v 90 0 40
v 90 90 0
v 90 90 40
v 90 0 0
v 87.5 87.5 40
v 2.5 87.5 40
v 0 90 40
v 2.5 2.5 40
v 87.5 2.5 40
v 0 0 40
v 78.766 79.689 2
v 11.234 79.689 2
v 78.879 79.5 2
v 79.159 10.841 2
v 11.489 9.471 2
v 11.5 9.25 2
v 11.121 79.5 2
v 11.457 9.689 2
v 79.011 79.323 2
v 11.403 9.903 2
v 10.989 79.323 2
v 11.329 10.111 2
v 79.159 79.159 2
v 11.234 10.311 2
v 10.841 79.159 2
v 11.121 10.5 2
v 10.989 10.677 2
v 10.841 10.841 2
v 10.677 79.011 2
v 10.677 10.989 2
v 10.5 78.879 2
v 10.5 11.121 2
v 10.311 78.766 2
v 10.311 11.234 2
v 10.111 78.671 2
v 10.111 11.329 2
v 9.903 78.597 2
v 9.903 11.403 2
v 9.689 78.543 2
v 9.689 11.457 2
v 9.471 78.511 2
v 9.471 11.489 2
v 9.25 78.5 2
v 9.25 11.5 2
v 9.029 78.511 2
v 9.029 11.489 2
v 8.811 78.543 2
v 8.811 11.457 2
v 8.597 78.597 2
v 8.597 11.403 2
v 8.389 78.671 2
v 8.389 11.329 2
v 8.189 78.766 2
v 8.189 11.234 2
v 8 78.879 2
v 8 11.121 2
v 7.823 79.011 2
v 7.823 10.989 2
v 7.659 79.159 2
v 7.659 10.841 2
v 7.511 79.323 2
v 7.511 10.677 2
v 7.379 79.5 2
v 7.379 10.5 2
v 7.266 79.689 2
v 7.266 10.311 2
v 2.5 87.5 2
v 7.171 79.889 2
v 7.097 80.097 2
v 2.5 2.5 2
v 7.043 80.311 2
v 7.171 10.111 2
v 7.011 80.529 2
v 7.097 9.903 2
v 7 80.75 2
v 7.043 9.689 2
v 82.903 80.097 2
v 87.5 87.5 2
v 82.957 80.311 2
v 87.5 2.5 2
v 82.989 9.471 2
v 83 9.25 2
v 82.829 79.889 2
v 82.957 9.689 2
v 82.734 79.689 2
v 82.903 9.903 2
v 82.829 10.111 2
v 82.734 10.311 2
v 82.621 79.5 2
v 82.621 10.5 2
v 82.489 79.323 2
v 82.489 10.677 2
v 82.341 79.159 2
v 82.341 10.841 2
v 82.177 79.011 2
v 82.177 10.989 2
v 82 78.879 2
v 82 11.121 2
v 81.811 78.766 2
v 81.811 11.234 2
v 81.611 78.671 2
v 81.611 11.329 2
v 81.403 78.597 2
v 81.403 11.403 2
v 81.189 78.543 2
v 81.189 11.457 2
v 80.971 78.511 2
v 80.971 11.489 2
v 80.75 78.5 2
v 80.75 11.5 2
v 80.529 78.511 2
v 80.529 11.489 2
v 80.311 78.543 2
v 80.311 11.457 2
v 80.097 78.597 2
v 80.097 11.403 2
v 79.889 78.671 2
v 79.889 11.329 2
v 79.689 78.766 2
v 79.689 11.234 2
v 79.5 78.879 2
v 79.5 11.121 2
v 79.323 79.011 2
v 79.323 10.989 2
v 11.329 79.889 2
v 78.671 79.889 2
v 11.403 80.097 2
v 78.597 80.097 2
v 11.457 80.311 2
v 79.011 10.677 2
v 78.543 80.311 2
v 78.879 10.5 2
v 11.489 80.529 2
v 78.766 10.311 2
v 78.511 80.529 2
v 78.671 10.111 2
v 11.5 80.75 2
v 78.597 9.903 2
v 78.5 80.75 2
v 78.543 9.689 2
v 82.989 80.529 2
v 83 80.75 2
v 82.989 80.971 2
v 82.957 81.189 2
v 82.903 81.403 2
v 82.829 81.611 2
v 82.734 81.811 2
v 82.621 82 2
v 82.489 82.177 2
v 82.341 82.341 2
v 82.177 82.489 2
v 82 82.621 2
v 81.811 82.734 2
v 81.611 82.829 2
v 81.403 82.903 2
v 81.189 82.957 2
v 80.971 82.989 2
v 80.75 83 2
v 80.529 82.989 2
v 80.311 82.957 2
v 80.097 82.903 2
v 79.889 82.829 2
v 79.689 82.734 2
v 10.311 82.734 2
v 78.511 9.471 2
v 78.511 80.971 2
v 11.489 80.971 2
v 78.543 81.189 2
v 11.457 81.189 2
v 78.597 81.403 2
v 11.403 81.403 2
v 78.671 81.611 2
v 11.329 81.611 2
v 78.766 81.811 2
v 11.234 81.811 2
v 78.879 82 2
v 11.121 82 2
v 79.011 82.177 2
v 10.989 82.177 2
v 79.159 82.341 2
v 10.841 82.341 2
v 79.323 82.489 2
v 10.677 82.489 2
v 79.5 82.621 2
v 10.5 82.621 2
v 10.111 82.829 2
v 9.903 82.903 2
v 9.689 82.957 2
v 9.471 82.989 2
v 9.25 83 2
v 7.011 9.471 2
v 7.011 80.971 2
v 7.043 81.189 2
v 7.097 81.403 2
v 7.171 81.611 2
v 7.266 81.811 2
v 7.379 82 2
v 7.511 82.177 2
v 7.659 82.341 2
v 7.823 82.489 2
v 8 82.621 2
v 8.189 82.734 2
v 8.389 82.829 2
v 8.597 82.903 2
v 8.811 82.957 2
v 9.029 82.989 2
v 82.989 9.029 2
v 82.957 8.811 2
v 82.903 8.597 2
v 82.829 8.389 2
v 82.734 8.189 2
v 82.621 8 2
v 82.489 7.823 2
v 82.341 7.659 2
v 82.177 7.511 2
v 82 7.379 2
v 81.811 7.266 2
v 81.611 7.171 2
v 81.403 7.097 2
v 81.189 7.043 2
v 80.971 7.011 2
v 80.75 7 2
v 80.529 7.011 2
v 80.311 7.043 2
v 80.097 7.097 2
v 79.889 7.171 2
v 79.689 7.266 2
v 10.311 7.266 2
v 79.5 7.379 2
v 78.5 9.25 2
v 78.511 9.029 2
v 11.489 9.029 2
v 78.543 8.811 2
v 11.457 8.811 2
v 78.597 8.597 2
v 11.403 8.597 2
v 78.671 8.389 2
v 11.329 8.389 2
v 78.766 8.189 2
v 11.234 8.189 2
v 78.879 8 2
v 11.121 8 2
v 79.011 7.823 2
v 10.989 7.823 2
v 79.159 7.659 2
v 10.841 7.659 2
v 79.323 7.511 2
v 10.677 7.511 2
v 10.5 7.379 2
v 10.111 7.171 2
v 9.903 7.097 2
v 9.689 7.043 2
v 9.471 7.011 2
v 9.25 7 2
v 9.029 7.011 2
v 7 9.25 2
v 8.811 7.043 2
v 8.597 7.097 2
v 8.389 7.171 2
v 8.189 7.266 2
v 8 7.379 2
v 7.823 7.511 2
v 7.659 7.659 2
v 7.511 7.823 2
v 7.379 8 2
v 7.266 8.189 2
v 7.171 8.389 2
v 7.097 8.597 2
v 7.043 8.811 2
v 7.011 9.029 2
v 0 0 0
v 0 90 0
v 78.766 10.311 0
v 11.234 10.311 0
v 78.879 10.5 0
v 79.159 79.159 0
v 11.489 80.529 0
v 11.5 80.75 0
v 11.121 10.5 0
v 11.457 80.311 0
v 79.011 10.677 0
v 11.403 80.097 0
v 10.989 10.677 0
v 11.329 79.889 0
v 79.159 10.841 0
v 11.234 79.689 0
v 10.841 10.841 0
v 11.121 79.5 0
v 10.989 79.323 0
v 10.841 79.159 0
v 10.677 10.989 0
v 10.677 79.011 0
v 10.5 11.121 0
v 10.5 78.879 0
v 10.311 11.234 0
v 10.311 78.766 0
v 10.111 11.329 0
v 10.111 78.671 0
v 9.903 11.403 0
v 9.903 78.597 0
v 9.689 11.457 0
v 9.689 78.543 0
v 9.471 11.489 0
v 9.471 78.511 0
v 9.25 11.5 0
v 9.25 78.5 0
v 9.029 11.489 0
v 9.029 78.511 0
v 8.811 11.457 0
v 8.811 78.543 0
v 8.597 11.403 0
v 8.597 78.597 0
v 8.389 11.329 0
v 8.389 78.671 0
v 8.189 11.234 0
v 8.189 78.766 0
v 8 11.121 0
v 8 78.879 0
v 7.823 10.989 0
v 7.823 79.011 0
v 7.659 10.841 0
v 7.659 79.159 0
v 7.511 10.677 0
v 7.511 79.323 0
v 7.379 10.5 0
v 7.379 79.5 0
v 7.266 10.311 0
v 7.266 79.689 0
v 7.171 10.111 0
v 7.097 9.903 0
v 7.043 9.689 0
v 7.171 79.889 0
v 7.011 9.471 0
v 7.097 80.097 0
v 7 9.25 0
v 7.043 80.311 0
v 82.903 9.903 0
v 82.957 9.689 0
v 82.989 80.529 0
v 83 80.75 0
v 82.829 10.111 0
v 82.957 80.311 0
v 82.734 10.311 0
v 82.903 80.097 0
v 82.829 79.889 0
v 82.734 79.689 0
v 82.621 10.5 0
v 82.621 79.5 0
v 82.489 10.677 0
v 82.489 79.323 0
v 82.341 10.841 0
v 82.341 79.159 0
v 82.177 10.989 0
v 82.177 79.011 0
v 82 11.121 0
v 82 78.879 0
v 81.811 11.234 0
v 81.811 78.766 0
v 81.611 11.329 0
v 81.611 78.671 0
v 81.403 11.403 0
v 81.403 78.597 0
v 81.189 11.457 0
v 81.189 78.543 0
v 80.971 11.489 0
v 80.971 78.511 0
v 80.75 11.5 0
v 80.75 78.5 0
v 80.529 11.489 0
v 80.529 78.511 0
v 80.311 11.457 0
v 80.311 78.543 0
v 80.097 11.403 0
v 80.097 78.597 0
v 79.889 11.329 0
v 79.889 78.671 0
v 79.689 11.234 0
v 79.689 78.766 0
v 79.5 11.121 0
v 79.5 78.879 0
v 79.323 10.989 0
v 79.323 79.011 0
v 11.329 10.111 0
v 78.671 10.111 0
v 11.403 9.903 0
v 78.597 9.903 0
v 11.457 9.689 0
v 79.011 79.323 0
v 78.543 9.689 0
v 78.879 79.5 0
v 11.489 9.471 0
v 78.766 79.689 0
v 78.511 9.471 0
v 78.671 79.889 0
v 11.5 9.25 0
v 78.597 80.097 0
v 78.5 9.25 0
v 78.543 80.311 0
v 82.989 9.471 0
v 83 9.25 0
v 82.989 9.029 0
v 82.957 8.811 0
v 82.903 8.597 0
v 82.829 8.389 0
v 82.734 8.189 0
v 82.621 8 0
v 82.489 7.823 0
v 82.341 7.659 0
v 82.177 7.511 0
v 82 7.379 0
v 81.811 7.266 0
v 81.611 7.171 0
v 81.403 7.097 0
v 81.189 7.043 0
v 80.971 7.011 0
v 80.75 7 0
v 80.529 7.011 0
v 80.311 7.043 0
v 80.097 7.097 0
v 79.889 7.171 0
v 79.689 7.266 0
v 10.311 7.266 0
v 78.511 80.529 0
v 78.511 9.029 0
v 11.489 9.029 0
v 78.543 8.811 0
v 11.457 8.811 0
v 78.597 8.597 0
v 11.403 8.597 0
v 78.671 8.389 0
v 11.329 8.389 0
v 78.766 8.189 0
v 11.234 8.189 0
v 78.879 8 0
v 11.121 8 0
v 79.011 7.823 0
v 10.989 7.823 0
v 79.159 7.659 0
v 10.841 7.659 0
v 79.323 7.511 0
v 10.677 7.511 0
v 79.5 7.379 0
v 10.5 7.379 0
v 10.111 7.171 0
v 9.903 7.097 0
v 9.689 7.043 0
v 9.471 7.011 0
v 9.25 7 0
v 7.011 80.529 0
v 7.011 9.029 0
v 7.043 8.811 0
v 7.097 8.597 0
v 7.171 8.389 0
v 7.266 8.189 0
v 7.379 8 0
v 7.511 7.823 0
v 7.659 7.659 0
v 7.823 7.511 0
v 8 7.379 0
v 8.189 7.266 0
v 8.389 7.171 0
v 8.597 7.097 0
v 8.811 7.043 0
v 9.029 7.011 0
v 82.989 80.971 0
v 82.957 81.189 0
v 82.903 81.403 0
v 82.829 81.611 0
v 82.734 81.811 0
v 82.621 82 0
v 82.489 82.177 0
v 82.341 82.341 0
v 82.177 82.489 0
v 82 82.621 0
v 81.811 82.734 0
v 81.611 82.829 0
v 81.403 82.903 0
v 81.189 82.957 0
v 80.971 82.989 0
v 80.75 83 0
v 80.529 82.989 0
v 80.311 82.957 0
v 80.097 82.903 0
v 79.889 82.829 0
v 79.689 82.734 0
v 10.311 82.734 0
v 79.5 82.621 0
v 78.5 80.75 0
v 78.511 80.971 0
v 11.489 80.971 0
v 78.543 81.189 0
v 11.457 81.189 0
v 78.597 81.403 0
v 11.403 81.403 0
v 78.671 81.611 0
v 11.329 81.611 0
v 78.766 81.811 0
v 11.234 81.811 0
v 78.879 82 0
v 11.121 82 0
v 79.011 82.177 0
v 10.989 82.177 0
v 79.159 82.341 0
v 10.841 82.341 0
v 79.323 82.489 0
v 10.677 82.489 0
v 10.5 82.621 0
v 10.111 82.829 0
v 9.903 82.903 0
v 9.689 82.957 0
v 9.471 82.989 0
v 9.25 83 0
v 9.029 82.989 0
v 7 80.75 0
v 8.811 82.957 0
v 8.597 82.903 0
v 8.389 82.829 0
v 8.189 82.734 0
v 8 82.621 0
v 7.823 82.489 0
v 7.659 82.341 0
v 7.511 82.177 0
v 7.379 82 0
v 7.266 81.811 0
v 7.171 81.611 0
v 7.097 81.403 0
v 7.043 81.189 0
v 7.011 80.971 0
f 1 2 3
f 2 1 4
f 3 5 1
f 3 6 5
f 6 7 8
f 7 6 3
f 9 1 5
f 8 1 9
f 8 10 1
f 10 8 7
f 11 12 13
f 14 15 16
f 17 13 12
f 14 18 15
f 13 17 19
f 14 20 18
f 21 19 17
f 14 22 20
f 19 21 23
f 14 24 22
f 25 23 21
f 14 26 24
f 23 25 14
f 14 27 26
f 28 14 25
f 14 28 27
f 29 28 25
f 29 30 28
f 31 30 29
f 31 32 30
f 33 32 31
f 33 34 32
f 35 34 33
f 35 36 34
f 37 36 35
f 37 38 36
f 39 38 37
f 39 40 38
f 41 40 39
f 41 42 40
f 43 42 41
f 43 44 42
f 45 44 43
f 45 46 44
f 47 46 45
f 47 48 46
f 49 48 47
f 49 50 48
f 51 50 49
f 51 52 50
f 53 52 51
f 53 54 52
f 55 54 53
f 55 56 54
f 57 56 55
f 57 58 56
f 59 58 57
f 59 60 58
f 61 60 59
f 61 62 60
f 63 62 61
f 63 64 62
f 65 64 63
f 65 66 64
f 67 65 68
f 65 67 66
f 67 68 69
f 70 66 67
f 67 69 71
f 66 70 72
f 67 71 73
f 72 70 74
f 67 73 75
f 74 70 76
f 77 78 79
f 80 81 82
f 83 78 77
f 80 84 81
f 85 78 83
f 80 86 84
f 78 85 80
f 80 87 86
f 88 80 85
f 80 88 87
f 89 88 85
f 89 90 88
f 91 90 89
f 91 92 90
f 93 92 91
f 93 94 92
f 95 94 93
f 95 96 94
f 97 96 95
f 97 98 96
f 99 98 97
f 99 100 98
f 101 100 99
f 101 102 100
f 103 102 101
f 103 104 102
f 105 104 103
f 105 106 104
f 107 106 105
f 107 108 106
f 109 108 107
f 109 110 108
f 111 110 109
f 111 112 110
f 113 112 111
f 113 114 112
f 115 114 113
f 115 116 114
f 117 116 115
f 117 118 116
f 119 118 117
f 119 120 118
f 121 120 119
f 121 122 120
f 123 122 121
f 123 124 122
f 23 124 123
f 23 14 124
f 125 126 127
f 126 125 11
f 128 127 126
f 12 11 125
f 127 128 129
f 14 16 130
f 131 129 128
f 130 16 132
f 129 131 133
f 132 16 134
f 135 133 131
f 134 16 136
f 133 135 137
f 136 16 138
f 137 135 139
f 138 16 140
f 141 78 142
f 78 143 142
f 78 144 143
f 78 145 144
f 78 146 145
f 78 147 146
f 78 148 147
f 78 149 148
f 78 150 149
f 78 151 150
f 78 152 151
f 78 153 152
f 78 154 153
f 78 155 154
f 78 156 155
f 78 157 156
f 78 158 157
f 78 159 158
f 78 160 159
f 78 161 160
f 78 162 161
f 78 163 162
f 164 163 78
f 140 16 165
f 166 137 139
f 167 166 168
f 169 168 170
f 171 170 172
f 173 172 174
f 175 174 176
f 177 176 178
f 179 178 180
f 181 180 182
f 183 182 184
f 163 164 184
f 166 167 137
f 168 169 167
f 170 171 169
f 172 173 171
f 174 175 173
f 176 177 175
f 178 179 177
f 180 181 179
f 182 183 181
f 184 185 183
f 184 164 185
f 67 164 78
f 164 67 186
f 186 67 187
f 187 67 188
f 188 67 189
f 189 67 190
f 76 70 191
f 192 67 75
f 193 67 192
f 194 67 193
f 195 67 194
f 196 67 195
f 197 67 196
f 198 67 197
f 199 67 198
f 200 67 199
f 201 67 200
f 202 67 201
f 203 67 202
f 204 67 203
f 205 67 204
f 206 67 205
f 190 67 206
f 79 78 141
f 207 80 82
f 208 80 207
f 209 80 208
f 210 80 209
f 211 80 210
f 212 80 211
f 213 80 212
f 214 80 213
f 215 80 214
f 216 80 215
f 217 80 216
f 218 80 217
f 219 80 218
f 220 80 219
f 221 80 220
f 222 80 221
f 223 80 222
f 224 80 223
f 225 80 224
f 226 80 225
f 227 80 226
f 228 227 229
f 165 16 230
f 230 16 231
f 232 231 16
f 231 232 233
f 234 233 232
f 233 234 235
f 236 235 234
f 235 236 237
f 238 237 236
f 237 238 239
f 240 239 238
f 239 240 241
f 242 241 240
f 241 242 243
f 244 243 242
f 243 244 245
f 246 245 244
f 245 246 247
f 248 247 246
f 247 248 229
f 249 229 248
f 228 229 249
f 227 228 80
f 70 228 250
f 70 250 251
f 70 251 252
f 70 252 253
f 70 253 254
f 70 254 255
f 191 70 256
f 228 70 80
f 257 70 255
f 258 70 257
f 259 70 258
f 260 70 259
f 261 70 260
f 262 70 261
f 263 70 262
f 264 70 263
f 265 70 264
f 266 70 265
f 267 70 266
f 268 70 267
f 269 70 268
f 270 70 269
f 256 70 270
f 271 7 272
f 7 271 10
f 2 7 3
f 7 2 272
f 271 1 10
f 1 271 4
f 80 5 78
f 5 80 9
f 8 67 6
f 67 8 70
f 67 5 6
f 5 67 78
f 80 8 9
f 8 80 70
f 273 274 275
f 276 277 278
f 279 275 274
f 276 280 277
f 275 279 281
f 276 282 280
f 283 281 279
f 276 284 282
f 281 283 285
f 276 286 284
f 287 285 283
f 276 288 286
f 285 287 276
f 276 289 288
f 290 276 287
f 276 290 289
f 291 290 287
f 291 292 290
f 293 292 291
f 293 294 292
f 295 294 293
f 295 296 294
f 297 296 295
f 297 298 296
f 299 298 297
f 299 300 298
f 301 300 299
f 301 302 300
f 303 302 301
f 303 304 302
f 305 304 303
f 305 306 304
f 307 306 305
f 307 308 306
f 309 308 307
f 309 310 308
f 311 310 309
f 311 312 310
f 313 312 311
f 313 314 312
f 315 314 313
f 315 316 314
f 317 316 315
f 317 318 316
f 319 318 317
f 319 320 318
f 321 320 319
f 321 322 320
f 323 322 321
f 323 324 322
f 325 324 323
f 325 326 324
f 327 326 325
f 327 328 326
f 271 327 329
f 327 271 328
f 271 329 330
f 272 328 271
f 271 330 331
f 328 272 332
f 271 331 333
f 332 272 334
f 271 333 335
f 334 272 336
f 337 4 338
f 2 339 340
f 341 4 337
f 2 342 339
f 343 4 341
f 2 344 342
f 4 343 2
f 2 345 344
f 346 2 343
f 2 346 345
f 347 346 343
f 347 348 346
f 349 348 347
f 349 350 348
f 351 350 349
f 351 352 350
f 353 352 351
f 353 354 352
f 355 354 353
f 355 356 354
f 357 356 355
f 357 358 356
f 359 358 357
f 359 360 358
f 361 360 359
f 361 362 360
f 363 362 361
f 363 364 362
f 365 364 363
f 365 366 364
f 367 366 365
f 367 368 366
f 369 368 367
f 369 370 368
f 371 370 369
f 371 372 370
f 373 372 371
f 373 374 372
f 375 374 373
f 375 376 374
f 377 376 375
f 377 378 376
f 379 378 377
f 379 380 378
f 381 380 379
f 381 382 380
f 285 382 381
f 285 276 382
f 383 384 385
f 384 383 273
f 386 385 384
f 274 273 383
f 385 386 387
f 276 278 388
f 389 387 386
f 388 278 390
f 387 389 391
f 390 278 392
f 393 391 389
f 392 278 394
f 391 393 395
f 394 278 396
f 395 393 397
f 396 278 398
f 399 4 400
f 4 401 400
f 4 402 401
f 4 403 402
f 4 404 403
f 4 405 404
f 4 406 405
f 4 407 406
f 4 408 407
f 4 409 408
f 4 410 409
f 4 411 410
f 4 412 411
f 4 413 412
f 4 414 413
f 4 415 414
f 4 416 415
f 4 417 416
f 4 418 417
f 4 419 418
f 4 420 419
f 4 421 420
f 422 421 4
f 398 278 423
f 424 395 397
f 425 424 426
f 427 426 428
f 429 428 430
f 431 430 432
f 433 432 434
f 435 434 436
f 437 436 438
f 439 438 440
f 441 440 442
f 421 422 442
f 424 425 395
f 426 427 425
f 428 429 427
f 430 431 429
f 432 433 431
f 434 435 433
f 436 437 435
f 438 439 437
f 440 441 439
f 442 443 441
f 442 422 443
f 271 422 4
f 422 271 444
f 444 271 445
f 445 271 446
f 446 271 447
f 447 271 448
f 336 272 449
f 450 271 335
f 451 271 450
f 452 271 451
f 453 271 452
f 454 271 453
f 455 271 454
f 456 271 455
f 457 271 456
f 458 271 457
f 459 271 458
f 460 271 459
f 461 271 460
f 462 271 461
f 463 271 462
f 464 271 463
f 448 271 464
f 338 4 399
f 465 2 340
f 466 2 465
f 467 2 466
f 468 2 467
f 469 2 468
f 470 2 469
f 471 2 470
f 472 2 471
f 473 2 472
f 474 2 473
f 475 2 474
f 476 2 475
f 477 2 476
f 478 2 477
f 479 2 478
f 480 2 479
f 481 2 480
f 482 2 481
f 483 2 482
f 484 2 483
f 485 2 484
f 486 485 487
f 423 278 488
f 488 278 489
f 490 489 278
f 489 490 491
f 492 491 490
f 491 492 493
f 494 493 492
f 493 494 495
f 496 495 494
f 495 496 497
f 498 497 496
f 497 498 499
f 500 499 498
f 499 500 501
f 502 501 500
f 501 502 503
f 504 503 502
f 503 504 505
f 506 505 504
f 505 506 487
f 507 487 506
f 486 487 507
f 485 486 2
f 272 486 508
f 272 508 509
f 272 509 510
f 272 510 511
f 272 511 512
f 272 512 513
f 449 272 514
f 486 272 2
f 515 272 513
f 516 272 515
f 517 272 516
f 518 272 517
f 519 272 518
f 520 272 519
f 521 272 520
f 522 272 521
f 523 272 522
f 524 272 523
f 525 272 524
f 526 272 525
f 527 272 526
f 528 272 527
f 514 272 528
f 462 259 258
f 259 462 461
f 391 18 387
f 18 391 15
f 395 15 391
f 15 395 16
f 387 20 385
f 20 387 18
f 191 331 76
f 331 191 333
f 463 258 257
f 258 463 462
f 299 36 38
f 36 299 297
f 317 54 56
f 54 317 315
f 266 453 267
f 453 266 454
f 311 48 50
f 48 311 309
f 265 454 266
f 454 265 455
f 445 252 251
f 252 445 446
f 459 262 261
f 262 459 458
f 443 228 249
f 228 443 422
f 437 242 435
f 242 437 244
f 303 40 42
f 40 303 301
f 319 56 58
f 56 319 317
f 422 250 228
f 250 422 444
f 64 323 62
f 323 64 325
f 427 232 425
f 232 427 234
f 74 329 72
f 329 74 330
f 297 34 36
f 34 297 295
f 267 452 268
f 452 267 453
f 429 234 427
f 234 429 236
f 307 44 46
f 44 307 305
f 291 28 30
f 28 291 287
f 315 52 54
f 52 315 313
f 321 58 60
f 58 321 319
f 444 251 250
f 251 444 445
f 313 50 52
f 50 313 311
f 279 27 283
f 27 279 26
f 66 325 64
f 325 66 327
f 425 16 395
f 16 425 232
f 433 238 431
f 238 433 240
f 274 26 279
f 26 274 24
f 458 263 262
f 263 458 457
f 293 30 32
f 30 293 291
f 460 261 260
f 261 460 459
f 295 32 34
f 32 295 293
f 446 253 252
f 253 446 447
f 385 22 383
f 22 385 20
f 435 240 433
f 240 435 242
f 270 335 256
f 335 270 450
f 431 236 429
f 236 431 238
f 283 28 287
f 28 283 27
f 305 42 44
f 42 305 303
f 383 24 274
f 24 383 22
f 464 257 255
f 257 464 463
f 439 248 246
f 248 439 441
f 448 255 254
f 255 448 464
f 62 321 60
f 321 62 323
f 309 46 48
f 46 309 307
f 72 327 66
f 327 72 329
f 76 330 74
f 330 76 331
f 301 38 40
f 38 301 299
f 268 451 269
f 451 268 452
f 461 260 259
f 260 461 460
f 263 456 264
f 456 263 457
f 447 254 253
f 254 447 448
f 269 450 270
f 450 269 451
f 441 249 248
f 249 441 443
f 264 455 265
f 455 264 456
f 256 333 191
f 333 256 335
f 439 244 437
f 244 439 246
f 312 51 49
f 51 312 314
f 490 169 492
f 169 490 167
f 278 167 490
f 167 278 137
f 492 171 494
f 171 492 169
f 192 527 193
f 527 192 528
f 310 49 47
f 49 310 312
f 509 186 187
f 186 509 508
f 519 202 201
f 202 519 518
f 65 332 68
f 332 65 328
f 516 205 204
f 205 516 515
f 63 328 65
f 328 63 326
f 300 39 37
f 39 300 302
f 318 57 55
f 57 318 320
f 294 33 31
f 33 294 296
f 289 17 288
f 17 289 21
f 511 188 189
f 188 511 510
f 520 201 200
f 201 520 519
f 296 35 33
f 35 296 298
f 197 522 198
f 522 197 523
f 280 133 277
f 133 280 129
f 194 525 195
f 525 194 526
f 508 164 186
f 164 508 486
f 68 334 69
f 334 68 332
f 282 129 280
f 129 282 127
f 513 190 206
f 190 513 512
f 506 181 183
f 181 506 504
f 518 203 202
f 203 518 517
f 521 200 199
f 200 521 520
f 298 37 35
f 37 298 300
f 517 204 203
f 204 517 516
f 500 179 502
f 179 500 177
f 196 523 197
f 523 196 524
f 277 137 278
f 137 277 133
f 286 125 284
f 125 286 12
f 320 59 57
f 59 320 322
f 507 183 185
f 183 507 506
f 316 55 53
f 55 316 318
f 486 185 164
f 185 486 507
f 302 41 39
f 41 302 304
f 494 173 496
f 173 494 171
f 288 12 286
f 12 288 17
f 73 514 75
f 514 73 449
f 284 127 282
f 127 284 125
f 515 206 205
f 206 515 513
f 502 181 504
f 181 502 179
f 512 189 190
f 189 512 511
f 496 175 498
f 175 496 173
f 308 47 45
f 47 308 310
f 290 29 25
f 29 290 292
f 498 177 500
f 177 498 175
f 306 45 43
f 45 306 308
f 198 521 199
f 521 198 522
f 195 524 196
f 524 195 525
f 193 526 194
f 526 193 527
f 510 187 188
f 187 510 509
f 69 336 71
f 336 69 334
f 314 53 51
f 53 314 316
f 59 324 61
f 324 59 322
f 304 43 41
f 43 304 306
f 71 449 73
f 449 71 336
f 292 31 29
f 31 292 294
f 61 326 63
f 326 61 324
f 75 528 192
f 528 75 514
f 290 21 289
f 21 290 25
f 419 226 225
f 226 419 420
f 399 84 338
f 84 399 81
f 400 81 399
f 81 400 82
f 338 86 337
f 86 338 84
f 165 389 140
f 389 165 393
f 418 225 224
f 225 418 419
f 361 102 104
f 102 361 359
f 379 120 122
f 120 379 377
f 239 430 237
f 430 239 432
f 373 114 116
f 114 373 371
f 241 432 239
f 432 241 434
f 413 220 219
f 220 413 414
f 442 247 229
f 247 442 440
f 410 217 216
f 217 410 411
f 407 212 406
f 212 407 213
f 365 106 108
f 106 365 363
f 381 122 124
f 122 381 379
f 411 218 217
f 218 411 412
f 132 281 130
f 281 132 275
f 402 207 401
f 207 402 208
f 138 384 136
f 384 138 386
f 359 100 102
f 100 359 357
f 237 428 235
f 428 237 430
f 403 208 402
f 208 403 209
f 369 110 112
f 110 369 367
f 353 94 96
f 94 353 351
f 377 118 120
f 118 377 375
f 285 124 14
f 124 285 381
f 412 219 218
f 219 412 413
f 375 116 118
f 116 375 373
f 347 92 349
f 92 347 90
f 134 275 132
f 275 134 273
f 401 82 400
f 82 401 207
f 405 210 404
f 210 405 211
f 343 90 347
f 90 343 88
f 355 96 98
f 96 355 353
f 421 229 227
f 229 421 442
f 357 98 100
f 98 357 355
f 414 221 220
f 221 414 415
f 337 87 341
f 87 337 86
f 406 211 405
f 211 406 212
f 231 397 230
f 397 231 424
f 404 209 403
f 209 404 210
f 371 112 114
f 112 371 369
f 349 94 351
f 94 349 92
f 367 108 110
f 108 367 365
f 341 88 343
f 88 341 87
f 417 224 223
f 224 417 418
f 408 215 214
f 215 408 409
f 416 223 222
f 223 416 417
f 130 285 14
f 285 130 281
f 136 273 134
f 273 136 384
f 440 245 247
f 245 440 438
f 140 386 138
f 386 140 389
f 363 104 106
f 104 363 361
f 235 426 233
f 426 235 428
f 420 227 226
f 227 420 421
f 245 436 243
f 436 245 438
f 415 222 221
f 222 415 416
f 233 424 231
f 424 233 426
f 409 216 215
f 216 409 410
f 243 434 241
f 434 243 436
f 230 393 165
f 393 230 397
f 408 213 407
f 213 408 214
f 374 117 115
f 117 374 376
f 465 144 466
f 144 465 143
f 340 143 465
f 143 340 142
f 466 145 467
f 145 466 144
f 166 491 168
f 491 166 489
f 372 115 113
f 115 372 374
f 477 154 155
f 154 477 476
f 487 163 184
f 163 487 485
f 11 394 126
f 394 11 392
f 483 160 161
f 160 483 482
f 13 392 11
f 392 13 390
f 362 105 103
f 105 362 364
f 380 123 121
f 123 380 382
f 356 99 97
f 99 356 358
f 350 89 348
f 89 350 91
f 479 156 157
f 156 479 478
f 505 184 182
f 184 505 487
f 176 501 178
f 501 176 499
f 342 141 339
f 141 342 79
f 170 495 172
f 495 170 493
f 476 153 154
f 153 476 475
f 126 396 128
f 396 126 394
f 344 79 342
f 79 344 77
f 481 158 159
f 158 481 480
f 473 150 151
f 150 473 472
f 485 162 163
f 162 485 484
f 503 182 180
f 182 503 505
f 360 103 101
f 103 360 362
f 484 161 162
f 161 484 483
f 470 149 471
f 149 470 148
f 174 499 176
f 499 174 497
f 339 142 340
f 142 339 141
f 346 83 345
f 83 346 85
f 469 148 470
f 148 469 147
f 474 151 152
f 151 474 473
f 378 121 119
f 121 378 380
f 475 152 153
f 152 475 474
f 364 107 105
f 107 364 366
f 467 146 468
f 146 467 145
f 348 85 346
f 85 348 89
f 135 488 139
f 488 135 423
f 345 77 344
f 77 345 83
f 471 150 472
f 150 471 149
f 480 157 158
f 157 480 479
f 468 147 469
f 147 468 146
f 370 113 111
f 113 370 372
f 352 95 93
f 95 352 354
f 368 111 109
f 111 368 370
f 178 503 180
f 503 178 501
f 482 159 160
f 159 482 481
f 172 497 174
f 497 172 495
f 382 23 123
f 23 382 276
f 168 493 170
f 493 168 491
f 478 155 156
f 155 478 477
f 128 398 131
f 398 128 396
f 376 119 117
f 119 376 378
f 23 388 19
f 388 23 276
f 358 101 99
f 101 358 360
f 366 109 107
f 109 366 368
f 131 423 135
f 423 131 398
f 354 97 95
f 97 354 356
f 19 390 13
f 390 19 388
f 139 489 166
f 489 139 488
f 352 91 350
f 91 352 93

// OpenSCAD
// --- Dimensions (mm) ---
outer_width = 90;          // Outer width and length of the box
outer_depth = 90;          // Outer depth and length of the box
wall_thickness = 2.5;       // Thickness of the four side walls
top_plate_thickness = 2;    // Thickness of the top plate (resting on bed)
total_height = 40;          // Total height of the housing
screw_hole_diameter = 4.5;  // Diameter for M4 screw holes
screw_pattern_size = 71.5;  // Distance between screw holes (center to center)
notch_width = 12;           // Width of the cable notch
notch_depth = 8;            // Depth of the notch from the open top
$fn = 64;                   // Smoothness for holes and cylinders

// --- Implementation ---

// The model is printed upside down: 
// The top plate is at Z = 0 to Z = top_plate_thickness.
// The walls rise from the plate up to Z = total_height.

module housing() {
    difference() {
        // Main Body (The outer shell)
        union() {
            // The Top Plate (Base of the box when upright, on bed when printing)
            cube([outer_width, outer_depth, top_plate_thickness]);
            
            // The Four Walls
            translate([0, 0, top_plate_thickness])
            difference() {
                // Outer volume of the walls
                cube([outer_width, outer_depth, total_height - top_plate_thickness]);
                
                // Hollow out the inside
                translate([wall_thickness, wall_thickness, -0.01])
                cube([outer_width - 2 * wall_thickness, outer_depth - 2 * wall_thickness, total_height]);
            }
        }

        // Screw Holes (M4)
        // We subtract these from the top plate. 
        // We extend the hole slightly in Z to ensure a clean cut.
        for (i = [-1, 1], j = [-1, 1]) {
            translate([
                (outer_width / 2) + (i * screw_pattern_size / 2), 
                (outer_depth / 2) + (j * screw_pattern_size / 2), 
                -1
            ])
            cylinder(h = top_plate_thickness + 2, d = screw_hole_diameter);
        }

        // Cable Notch
        // Located in one wall, centered along the wall, 
        // reaching 8mm down from the open edge (z = 32 to z = 40).
        // Since we are printing upside down, the "open edge" is at Z = 40.
        // The notch is cut from the top of the walls.
        translate([
            (outer_width / 2) - wall_thickness, // Positioned at the edge of one wall
            (outer_depth / 2) - (notch_width / 2), 
            total_height - notch_depth
        ])
        cube([wall_thickness + 1, notch_width, notch_depth + 0.1]);
    }
}

// Render the part
housing();
